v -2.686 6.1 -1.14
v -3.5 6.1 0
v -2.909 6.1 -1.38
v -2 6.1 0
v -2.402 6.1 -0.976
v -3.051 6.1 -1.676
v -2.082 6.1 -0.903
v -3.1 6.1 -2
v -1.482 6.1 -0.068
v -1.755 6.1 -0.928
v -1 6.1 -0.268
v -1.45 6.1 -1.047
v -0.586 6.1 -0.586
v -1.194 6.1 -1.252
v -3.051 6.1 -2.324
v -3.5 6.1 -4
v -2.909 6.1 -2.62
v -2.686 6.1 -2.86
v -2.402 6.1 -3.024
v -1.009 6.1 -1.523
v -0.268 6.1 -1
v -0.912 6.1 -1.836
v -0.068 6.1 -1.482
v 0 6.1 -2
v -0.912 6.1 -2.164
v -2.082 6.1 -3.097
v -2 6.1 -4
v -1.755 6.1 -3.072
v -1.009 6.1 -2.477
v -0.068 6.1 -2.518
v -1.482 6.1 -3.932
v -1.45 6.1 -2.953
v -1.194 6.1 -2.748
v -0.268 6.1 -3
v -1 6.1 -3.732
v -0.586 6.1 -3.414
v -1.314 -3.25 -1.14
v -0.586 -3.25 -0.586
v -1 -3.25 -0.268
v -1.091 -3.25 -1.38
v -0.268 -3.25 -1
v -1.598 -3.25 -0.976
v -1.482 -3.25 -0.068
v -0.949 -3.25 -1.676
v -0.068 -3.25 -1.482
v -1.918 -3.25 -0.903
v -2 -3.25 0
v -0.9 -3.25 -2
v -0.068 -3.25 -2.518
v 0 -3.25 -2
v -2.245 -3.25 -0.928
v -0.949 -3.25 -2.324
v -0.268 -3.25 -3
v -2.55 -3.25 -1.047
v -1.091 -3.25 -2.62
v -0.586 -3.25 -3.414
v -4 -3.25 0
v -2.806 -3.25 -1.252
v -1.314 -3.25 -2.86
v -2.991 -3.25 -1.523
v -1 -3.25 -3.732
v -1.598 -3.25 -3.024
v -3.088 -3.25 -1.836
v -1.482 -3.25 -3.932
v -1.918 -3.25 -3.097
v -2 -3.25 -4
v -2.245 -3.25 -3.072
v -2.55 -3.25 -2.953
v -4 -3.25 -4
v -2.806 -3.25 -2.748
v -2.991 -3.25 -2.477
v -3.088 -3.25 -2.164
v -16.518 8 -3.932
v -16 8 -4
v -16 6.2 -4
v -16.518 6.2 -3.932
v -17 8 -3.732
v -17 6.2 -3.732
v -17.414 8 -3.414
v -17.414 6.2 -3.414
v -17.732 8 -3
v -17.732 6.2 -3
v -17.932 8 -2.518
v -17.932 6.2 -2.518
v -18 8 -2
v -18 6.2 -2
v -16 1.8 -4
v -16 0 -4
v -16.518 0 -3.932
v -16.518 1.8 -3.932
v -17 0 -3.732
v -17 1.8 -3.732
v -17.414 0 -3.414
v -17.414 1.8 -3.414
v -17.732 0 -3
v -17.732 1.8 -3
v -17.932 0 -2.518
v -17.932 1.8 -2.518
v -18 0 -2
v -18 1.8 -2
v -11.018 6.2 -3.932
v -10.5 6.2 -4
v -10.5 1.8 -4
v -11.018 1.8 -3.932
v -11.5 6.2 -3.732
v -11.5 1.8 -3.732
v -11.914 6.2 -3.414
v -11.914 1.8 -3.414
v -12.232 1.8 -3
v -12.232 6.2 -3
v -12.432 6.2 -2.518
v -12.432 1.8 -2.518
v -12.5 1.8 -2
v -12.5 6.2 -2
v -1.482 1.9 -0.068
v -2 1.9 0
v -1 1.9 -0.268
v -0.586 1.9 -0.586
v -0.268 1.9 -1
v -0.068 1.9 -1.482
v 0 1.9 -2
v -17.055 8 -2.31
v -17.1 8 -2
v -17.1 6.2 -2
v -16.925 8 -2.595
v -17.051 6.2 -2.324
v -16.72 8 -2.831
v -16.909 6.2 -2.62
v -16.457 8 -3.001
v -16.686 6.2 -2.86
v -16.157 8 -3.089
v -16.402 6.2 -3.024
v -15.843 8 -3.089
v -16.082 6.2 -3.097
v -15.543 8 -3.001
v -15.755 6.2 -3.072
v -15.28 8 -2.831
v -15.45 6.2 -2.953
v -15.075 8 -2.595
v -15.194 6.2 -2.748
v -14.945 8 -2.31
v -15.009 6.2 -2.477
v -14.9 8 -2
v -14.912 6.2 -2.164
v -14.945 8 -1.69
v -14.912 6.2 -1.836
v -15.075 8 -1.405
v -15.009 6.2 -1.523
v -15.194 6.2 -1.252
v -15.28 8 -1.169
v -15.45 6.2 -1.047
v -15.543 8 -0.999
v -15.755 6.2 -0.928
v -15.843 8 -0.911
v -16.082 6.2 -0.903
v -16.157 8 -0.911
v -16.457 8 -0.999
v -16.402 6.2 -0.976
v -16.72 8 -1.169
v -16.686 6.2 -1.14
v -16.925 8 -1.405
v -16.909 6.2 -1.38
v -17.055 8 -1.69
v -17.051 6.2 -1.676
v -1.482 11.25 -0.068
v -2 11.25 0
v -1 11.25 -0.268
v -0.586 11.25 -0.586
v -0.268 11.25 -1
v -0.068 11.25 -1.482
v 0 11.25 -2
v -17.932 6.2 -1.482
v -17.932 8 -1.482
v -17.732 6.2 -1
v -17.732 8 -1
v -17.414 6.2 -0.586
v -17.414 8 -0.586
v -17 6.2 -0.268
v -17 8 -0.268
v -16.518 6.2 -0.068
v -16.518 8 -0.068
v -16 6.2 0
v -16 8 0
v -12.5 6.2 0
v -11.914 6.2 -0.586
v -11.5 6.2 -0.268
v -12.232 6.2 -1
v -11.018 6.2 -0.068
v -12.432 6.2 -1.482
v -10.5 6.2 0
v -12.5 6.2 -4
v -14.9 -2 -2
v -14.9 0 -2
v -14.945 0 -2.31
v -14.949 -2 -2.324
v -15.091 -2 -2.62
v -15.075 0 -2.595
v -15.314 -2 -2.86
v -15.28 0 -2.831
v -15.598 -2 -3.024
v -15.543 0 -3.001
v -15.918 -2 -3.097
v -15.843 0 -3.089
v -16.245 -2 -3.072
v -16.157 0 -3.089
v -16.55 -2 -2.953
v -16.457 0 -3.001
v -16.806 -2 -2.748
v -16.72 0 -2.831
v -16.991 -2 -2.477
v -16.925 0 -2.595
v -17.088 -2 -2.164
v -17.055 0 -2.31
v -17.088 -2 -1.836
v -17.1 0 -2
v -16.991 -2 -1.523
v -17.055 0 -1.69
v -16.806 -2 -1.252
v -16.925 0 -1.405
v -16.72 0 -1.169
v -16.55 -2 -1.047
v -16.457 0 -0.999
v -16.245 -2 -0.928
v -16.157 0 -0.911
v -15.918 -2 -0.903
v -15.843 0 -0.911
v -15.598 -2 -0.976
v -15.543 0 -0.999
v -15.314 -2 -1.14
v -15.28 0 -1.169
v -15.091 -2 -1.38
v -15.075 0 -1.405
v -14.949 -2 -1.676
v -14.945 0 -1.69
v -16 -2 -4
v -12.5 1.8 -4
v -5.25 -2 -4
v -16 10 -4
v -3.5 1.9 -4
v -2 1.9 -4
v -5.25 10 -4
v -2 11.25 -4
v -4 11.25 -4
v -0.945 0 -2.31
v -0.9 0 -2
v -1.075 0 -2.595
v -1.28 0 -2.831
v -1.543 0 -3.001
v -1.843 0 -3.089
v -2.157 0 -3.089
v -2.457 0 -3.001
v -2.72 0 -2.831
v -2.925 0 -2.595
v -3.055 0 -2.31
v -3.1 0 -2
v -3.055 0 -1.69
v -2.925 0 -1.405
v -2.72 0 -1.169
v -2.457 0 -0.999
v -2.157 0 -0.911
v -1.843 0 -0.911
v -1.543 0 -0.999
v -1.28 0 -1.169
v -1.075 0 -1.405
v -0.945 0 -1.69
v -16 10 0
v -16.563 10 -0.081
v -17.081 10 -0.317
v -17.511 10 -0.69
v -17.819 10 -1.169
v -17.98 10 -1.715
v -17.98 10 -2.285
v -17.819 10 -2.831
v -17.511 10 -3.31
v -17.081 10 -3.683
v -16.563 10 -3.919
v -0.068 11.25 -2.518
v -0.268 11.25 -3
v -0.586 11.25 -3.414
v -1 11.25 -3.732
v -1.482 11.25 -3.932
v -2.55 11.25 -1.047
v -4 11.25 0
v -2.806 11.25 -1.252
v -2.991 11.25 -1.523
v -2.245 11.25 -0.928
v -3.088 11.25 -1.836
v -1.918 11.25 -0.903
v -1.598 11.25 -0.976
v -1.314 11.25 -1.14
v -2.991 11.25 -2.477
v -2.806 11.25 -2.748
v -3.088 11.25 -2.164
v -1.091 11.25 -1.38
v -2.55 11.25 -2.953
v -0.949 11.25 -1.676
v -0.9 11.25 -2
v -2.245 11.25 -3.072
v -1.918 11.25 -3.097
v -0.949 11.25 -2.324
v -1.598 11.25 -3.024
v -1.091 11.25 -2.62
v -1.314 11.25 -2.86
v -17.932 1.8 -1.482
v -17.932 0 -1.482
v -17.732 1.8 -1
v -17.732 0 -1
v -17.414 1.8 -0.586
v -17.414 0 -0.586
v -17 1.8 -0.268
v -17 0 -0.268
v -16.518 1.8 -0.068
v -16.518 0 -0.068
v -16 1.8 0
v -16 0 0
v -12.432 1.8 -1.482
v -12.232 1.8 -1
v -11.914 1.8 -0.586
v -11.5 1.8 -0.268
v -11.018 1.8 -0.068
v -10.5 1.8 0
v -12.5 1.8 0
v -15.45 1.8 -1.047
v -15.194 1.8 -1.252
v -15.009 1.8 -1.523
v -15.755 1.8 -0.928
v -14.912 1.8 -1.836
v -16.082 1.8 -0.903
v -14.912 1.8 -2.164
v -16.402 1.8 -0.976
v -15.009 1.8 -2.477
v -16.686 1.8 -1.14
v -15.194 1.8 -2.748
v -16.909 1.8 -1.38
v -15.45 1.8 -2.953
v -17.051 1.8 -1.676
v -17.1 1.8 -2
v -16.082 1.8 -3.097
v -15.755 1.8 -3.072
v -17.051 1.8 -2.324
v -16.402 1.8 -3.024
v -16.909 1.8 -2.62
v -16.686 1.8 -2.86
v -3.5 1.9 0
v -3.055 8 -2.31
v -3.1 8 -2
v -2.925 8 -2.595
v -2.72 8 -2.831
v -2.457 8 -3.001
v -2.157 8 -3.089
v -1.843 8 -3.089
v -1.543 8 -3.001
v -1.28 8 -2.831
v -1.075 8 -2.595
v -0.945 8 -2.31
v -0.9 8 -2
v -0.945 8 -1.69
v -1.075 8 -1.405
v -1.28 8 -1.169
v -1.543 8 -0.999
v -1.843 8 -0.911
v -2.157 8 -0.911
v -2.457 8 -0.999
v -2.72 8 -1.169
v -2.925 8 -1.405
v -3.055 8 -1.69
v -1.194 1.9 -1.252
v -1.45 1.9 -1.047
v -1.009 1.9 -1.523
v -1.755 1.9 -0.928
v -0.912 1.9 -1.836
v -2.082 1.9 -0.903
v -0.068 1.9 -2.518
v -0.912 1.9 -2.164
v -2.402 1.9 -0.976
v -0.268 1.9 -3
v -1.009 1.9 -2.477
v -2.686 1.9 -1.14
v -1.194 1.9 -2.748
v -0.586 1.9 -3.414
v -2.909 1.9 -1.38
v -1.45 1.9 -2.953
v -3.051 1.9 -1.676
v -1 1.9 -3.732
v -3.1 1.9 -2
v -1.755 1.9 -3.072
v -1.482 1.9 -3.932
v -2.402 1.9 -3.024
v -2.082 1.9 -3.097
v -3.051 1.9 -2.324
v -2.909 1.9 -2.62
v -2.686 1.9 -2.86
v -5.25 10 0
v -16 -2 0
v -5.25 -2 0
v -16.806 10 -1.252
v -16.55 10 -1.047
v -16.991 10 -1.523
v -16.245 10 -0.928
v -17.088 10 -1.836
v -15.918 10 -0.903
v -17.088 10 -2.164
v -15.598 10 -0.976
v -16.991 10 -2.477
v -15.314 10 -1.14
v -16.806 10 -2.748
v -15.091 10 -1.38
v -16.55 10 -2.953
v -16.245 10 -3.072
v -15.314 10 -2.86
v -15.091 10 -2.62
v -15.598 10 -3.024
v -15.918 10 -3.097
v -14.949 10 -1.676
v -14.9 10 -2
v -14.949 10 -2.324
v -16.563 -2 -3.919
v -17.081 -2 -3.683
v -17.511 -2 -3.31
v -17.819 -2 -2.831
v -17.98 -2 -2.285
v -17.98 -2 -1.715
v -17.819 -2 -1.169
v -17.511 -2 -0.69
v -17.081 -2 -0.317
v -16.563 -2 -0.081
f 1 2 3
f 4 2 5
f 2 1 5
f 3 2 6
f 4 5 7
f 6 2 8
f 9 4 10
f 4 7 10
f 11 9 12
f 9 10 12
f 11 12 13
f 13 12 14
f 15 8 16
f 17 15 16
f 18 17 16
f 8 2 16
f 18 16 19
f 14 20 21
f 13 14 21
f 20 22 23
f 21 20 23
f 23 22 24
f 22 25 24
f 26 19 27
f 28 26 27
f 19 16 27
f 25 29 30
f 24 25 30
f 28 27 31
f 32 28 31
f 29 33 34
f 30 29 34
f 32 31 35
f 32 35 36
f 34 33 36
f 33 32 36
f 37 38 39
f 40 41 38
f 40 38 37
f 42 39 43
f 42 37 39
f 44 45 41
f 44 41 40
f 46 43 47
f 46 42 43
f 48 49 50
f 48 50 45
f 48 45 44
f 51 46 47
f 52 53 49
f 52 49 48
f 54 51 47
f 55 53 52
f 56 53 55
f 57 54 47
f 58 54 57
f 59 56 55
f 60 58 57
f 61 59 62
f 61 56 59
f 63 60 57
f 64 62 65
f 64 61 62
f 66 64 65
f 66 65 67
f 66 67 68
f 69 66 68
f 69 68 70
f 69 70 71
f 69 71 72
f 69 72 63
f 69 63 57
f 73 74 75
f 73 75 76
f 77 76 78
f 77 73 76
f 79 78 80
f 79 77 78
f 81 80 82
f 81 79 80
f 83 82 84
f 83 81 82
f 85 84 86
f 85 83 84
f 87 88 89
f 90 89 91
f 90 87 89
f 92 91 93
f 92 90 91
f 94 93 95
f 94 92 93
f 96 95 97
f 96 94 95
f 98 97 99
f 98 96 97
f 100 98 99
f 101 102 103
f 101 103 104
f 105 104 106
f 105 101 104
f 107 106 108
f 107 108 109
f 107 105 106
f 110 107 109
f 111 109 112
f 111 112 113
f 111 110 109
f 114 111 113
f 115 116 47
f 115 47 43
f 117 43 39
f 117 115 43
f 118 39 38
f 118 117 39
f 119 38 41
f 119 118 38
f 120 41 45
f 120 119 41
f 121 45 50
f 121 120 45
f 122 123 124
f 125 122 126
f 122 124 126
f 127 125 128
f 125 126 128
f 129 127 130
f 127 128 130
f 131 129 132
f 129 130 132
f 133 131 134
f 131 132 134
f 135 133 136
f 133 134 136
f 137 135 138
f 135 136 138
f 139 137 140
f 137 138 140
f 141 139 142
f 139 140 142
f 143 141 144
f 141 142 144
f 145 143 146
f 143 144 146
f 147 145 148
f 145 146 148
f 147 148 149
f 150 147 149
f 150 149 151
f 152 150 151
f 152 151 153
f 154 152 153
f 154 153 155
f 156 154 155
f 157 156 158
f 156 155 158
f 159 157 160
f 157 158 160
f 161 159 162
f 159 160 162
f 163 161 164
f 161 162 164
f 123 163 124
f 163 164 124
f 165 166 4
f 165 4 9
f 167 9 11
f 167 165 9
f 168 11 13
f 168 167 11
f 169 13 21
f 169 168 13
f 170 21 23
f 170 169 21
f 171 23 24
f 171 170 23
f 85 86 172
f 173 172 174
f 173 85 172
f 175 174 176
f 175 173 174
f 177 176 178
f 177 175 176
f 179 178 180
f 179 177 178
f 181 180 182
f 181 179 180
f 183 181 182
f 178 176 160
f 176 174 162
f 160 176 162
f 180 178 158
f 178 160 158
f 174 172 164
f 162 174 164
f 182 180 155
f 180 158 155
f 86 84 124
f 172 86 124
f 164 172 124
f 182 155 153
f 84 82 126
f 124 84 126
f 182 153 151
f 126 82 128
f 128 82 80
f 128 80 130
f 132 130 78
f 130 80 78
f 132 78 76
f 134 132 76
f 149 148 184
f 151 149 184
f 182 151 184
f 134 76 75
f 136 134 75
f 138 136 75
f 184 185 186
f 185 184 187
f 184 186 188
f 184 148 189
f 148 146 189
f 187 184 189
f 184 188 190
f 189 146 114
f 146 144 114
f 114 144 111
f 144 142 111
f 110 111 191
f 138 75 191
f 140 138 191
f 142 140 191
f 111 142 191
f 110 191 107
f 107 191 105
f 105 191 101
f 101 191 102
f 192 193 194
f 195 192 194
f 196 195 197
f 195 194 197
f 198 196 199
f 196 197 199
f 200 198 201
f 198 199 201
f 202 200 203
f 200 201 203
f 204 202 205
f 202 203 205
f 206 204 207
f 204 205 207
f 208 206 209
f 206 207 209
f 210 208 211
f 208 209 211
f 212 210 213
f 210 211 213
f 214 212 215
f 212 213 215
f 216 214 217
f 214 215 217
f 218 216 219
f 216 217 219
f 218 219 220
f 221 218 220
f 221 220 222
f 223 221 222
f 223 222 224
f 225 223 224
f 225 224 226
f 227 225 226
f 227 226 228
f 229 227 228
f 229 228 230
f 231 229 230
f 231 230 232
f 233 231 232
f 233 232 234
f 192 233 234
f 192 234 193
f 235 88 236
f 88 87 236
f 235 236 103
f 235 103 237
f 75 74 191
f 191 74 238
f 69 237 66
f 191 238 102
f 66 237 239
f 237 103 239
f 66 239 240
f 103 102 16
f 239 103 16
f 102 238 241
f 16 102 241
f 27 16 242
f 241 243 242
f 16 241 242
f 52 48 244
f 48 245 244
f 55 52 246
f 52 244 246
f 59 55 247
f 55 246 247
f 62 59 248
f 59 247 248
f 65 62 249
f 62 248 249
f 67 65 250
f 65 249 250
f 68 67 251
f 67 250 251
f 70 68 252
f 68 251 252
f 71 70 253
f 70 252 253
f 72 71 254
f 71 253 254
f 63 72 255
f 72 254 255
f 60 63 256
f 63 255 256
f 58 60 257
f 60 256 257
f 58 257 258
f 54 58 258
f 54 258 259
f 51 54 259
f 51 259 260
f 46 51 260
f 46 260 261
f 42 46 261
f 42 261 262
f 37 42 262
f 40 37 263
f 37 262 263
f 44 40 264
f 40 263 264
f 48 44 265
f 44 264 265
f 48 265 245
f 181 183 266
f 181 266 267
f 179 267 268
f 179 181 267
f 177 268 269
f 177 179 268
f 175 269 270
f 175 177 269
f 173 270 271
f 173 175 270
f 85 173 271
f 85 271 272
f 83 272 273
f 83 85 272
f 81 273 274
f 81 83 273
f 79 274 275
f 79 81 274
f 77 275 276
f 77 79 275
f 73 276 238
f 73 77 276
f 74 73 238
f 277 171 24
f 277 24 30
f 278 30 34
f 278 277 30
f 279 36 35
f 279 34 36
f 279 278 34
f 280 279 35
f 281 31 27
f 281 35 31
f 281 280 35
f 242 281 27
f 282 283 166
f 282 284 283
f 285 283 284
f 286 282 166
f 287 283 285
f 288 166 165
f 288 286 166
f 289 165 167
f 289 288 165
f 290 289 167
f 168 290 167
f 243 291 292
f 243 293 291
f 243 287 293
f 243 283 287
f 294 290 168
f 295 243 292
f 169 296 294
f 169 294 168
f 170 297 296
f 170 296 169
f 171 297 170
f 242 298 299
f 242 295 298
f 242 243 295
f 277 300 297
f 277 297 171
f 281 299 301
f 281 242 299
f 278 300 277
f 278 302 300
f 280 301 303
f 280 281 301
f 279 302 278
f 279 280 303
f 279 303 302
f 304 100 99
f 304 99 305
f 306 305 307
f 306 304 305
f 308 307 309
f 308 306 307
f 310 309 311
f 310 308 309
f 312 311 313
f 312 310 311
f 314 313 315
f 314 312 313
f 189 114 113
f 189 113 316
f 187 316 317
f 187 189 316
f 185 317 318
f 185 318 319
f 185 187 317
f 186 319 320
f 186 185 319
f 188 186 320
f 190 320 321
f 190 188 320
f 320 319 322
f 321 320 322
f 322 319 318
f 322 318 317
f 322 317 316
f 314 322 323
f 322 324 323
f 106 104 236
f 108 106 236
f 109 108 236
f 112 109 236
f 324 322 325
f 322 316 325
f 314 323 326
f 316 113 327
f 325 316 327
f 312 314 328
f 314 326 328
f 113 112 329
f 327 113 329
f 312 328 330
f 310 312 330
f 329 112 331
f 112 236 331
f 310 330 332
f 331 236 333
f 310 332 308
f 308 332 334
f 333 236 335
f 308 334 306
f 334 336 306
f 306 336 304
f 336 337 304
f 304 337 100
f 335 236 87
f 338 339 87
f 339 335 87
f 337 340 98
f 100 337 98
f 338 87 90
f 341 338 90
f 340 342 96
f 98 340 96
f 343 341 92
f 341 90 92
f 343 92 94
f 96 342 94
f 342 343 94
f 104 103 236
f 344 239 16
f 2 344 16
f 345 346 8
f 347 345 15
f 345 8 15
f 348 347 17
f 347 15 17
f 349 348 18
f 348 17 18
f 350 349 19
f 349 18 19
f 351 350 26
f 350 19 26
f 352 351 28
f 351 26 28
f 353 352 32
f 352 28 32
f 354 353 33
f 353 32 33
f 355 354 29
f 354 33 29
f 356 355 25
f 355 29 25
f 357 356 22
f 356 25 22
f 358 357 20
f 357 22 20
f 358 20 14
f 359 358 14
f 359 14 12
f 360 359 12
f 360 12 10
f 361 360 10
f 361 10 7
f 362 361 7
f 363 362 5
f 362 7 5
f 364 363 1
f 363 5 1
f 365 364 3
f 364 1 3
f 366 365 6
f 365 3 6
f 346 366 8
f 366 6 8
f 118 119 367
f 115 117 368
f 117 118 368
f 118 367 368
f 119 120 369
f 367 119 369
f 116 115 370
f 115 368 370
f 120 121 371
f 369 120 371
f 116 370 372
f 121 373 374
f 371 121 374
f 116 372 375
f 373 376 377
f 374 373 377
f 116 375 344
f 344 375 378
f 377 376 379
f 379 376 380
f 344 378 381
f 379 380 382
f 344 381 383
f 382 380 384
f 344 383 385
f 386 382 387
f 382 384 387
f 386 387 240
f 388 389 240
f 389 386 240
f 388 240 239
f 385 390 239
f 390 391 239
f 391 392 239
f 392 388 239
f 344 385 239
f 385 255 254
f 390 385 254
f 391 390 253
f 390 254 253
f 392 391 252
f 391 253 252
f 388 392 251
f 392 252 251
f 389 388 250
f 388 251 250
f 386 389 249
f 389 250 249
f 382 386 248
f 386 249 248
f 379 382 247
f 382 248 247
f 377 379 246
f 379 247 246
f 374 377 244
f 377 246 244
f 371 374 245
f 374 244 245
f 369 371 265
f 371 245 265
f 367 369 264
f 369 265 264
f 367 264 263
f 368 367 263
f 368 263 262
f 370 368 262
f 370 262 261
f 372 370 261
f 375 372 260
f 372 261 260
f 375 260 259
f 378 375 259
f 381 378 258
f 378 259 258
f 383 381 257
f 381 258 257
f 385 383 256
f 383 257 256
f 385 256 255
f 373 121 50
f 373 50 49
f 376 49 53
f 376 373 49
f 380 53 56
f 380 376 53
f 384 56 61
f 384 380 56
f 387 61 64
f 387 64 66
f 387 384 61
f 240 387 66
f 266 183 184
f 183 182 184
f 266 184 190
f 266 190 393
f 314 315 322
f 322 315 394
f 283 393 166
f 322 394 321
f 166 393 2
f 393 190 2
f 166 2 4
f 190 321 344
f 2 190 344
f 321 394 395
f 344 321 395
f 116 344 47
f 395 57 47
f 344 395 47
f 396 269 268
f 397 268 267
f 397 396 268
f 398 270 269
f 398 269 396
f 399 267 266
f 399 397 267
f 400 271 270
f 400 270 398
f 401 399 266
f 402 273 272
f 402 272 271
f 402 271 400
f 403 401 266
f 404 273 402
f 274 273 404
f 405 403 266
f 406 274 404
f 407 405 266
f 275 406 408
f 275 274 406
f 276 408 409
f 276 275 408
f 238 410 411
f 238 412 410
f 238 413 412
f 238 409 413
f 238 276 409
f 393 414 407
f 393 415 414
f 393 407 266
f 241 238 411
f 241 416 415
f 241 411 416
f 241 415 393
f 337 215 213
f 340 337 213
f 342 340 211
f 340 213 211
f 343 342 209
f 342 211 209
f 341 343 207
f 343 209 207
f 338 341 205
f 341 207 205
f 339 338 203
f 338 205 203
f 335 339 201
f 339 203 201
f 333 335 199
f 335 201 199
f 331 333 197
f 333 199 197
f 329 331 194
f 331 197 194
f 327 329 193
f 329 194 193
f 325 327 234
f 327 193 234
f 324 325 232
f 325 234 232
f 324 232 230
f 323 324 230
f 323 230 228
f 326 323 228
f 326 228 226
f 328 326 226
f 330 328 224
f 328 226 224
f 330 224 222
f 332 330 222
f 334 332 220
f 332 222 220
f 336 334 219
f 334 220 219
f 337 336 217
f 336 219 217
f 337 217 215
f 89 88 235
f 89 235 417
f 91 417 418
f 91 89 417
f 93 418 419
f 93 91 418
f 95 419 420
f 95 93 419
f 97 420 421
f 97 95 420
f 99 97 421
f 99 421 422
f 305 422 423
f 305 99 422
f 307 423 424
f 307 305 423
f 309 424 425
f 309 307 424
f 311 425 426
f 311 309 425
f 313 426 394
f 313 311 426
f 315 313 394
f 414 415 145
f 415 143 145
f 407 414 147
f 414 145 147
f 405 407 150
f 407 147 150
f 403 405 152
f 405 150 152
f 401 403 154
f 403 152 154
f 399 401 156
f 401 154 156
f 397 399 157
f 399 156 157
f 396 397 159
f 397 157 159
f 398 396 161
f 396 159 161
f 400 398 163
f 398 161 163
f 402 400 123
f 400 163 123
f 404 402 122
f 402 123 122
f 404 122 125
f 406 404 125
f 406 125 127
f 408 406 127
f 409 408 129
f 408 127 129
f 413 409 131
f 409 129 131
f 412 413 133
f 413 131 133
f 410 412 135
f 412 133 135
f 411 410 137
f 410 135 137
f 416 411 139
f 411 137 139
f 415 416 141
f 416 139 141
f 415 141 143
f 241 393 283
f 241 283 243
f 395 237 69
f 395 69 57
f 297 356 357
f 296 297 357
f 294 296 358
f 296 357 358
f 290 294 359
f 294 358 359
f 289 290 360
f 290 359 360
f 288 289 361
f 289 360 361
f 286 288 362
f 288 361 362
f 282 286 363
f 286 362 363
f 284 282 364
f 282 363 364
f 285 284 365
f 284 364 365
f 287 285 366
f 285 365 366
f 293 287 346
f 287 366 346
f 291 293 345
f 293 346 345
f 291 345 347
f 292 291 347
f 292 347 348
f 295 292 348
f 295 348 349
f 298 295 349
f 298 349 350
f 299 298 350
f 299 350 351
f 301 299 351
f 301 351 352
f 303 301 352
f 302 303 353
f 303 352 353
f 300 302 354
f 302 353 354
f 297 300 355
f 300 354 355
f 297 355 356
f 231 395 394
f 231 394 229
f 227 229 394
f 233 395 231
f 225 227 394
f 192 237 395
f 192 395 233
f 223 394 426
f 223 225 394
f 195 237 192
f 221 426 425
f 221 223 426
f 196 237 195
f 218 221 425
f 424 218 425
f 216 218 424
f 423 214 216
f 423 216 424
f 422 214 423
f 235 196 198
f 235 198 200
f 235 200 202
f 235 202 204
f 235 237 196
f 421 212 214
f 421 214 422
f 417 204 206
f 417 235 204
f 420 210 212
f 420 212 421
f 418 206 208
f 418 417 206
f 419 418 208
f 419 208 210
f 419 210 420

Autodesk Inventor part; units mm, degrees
sketch "Sketch1" plane through (0, 0, 0) normal (0, 1, 0) x (-1, 0, 0)
  line L0 (0, 0) -> (18, 0)
  line L1 (18, 0) -> (18, -4)
  line L2 (18, -4) -> (0, -4)
  line L3 (0, -4) -> (0, 0)
  line L4 (18, -2) -> (16, -2)
  line L5 (9, -4) -> (9, -3)
  circle A0 centre (16, -2) radius 1.1
  circle A1 centre (2, -2) radius 1.1
  dimension "d0" = 18
  dimension "d1" = 4
  dimension "d2" = 2
  dimension "d3" = 2.2
sketch "Sketch1 outline for Extrusion1" plane through (0, 0, 0) normal (0, 1, 0) x (-1, 0, 0)
  line L0 (18, -4) -> (18, 0)
  line L1 (0, -4) -> (18, -4)
  line L2 (0, 0) -> (0, -4)
  line L3 (18, 0) -> (0, 0)
extrude "Extrusion1" add sketch "Sketch1 outline for Extrusion1" along normal blind 8
sketch "Sketch2" plane through (0, 0, -4) normal (0, 0, -1) x (-1, 0, 0)
  line L0 (18, 0) -> (18, 8) projected
  line L1 (18, 8) -> (18, 6.1)
  line L2 (18, 0) -> (0, 0) projected
  line L3 (18, 0) -> (18, 1.9)
  line L4 (18, 6.1) -> (14.5, 6.1)
  line L5 (14.5, 6.1) -> (14.5, 1.9)
  line L6 (14.5, 1.9) -> (18, 1.9)
  line L7 (18, 1.9) -> (18, 6.1)
  dimension "d6" = 1.9
  dimension "d7" = 1.9
  dimension "d8" = 3.5
sketch "Sketch2 outline for Extrusion2" plane through (0, 0, -4) normal (0, 0, -1) x (-1, 0, 0)
  line L0 (14.5, 6.1) -> (14.5, 1.9)
  line L1 (18, 6.1) -> (14.5, 6.1)
  line L2 (18, 1.9) -> (18, 6.1)
  line L3 (14.5, 1.9) -> (18, 1.9)
extrude "Extrusion2" cut sketch "Sketch2 outline for Extrusion2" against normal blind 8
ref_plane "Work Plane1" through (-9, 0, 0) normal (1, 0, 0) x (0, 0, -1)
mirror "Mirror1" about plane through (-9, 0, 0) normal (1, 0, 0) of "Extrusion2"
sketch "Sketch1 outline for Extrusion3" plane through (0, 0, 0) normal (0, 1, 0) x (-1, 0, 0)
  circle A0 centre (2, -2) radius 1.1
  circle A1 centre (16, -2) radius 1.1
extrude "Extrusion3" cut sketch "Sketch1 outline for Extrusion3" along normal blind 8
sketch "Sketch4" plane through (0, 8, 0) normal (0, 1, 0) x (1, 0, 0)
  line L0 (-18, 0) -> (0, 0) projected
  line L1 (0, 0) -> (-4, 0)
  line L2 (-4, 0) -> (-4, 4)
  line L3 (-4, 4) -> (0, 4)
  line L4 (0, 4) -> (0, 0)
  circle A0 centre (-2, 2) radius 1.1 projected
  circle A1 centre (-2, 2) radius 1.1
  dimension "d14" = 4
  dimension "d15" = 4
  dimension "d16" = 2.2
sketch "Sketch4 outline for Extrusion4" plane through (0, 8, 0) normal (0, 1, 0) x (1, 0, 0)
  line L0 (0, 0) -> (0, 4)
  line L1 (-4, 0) -> (0, 0)
  line L2 (0, 4) -> (-4, 4)
  line L3 (-4, 4) -> (-4, 0)
  circle A0 centre (-2, 2) radius 1.1
extrude "Extrusion4" add sketch "Sketch4 outline for Extrusion4" along normal blind 3.25
ref_plane "Work Plane2" through (-3.5, 4, 0) normal (0, 1, 0) x (1, 0, 0)
mirror "Mirror2" about plane through (-3.5, 4, 0) normal (0, 1, 0) of "Extrusion4"
fillet "Fillet2" radius 2 8 edges at (0, 8.675, -4) (0, -0.675, -4) (0, -0.675, 0) (0, 8.675, 0) (-18, 7.05, -4) (-18, 0.95, -4) (-18, 7.05, 0) (-18, 0.95, 0)
chamfer "Chamfer1" distance 3.25 angle 45 2 edges at (-4, 8, -2) (-4, 0, -2)
sketch "Sketch5" plane through (-14.5, 1.9, 0) normal (0, 0, 1) x (1, 0, 0)
  line L0 (0, 4.2) -> (0, 0) projected
  line L1 (0, 4.2) -> (2, 4.2)
  line L2 (2, 4.2) -> (2, 0)
  line L3 (2, 0) -> (0, 0)
  line L4 (0, 0) -> (0, 4.2)
  point P0 (14.5, -1.9)
  point P1 (0, 0)
  dimension "d23" = 2
sketch "Sketch5 outline for Extrusion5" plane through (-14.5, 1.9, 0) normal (0, 0, 1) x (1, 0, 0)
  line L0 (0, 0) -> (2, 0)
  line L1 (0, 4.2) -> (0, 0)
  line L2 (2, 4.2) -> (0, 4.2)
  line L3 (2, 0) -> (2, 4.2)
extrude "Extrusion5" cut sketch "Sketch5 outline for Extrusion5" against normal blind 20
sketch "Sketch6" plane through (0, 8, 0) normal (0, 1, 0) x (1, 0, 0)
  line L0 (-7.25, 4) -> (-4, 4) projected
  line L1 (-16, 0) -> (-12.5, 0) projected
  line L2 (-7.25, 4) -> (-16, 4)
  line L3 (-16, 4) -> (-16, 0)
  line L4 (-16, 0) -> (-7.25, 0)
  line L5 (-7.25, 0) -> (-7.25, 4)
  circle A0 centre (-16, 2) radius 2
  circle A1 centre (-16, 2) radius 1.1
  point P0 (0, 0)
sketch "Sketch6 outline for Extrusion6" plane through (0, 8, 0) normal (0, 1, 0) x (1, 0, 0)
  arc A0 (-16, 4) -> (-16, 0) centre (-16, 2) ccw
  line L0 (-7.25, 4) -> (-16, 4)
  line L1 (-16, 0) -> (-12.5, 0)
  line L2 (-7.25, 0) -> (-7.25, 4)
  line L3 (-12.5, 0) -> (-7.25, 0)
  circle A1 centre (-16, 2) radius 1.1
extrude "Extrusion6" add sketch "Sketch6 outline for Extrusion6" along normal blind 2
sketch "Sketch7" plane through (-3.5, 1.9, -4) normal (0, 0, -1) x (-1, 0, 0)
  line L0 (3.75, 6.1) -> (3.75, 8.1)
  line L1 (3.75, 8.1) -> (1.311143, 8.1)
  line L2 (1.311143, 8.1) -> (1.311143, 4.926567)
  line L3 (1.311143, 4.926567) -> (3.75, 4.926567)
  line L4 (3.75, 4.926567) -> (3.75, 8.1)
  point P0 (-3.5, -1.9)
sketch "Sketch7 outline for Extrusion7" plane through (-3.5, 1.9, -4) normal (0, 0, -1) x (-1, 0, 0)
  line L0 (1.311143, 4.926567) -> (3.75, 4.926567)
  line L1 (1.311143, 8.1) -> (1.311143, 4.926567)
  line L2 (3.75, 8.1) -> (1.311143, 8.1)
  line L3 (3.75, 6.1) -> (3.75, 8.1)
  line L4 (3.75, 4.926567) -> (3.75, 6.1)
extrude "Extrusion7" add sketch "Sketch7 outline for Extrusion7" against normal blind 4
ref_plane "Work Plane3" through (0, 4, 0) normal (0, 1, 0) x (1, 0, 0)
mirror "Mirror3" about plane through (0, 4, 0) normal (0, 1, 0) of "Extrusion6", "Extrusion7"
sketch "Sketch8" plane through (-3.5, 1.9, -4) normal (0, 0, -1) x (-1, 0, 0)
  line L0 (12.5, 0) -> (14.5, 0)
  line L1 (14.5, 0) -> (14.5, -0.1)
  line L2 (14.5, -3.9) -> (14.5, 0)
  line L3 (14.5, -0.1) -> (8.337258, -0.1)
  line L4 (14.5, 4.2) -> (12.5, 4.2)
  line L5 (14.5, 4.2) -> (14.5, 4.3)
  line L6 (14.5, 4.2) -> (14.5, 8.1)
  line L7 (14.5, 4.3) -> (6.488775, 4.3)
  line L8 (14.5, -0.1) -> (9.5, -0.1)
  line L9 (9.5, -0.1) -> (9.5, 4.3)
  line L10 (9.5, 4.3) -> (14.5, 4.3)
  line L11 (14.5, 4.3) -> (14.5, -0.1)
  point P0 (-3.5, -1.9)
  point P1 (9.5, -0.1)
  dimension "d30" = 0.1
  dimension "d31" = 0.1
sketch "Sketch8 outline for Extrusion8" plane through (-3.5, 1.9, -4) normal (0, 0, -1) x (-1, 0, 0)
  line L0 (14.5, 0) -> (14.5, 4.2)
  line L1 (14.5, -0.1) -> (14.5, 0)
  line L2 (9.5, -0.1) -> (14.5, -0.1)
  line L3 (9.5, 4.3) -> (9.5, -0.1)
  line L4 (14.5, 4.3) -> (9.5, 4.3)
  line L5 (14.5, 4.2) -> (14.5, 4.3)
extrude "Extrusion8" cut sketch "Sketch8 outline for Extrusion8" against normal blind 4
sketch "Sketch9" plane through (-3.5, 1.9, -4) normal (0, 0, -1) x (-1, 0, 0)
  line L0 (12.5, -0.1) -> (9.5, -0.1) projected
  line L1 (9, 0) -> (9, 4.2) projected
  line L2 (9.5, -0.1) -> (9, -0.1)
  line L3 (9, -0.1) -> (9, 0)
  line L4 (9, 0) -> (9.5, 0)
  line L5 (9.5, 0) -> (9.5, -0.1)
  line L6 (9, 4.2) -> (9.5, 4.2) projected
  line L7 (9.5, 4.2) -> (9.5, 4.3) projected
  line L8 (9, 4.2) -> (9.5, 4.2)
  line L9 (9.5, 4.2) -> (9.5, 4.3)
  line L10 (9.5, 4.3) -> (9, 4.3)
  line L11 (9, 4.3) -> (9, 4.2)
  point P0 (-3.5, -1.9)
sketch "Sketch9 outline for Extrusion9" plane through (-3.5, 1.9, -4) normal (0, 0, -1) x (-1, 0, 0)
  line L0 (9, 4.3) -> (9, 4.2)
  line L1 (9.5, 4.3) -> (9, 4.3)
  line L2 (9.5, 4.2) -> (9.5, 4.3)
  line L3 (9, 4.2) -> (9.5, 4.2)
  line L4 (9, 0) -> (9, -0.1)
  line L5 (9.5, 0) -> (9, 0)
  line L6 (9.5, -0.1) -> (9.5, 0)
  line L7 (9, -0.1) -> (9.5, -0.1)
extrude "Extrusion9" cut sketch "Sketch9 outline for Extrusion9" against normal blind 20
fillet "Fillet3" radius 2 2 edges at (-12.5, 4, -4) (-12.5, 4, 0)
properties part number "short_link_v2"
